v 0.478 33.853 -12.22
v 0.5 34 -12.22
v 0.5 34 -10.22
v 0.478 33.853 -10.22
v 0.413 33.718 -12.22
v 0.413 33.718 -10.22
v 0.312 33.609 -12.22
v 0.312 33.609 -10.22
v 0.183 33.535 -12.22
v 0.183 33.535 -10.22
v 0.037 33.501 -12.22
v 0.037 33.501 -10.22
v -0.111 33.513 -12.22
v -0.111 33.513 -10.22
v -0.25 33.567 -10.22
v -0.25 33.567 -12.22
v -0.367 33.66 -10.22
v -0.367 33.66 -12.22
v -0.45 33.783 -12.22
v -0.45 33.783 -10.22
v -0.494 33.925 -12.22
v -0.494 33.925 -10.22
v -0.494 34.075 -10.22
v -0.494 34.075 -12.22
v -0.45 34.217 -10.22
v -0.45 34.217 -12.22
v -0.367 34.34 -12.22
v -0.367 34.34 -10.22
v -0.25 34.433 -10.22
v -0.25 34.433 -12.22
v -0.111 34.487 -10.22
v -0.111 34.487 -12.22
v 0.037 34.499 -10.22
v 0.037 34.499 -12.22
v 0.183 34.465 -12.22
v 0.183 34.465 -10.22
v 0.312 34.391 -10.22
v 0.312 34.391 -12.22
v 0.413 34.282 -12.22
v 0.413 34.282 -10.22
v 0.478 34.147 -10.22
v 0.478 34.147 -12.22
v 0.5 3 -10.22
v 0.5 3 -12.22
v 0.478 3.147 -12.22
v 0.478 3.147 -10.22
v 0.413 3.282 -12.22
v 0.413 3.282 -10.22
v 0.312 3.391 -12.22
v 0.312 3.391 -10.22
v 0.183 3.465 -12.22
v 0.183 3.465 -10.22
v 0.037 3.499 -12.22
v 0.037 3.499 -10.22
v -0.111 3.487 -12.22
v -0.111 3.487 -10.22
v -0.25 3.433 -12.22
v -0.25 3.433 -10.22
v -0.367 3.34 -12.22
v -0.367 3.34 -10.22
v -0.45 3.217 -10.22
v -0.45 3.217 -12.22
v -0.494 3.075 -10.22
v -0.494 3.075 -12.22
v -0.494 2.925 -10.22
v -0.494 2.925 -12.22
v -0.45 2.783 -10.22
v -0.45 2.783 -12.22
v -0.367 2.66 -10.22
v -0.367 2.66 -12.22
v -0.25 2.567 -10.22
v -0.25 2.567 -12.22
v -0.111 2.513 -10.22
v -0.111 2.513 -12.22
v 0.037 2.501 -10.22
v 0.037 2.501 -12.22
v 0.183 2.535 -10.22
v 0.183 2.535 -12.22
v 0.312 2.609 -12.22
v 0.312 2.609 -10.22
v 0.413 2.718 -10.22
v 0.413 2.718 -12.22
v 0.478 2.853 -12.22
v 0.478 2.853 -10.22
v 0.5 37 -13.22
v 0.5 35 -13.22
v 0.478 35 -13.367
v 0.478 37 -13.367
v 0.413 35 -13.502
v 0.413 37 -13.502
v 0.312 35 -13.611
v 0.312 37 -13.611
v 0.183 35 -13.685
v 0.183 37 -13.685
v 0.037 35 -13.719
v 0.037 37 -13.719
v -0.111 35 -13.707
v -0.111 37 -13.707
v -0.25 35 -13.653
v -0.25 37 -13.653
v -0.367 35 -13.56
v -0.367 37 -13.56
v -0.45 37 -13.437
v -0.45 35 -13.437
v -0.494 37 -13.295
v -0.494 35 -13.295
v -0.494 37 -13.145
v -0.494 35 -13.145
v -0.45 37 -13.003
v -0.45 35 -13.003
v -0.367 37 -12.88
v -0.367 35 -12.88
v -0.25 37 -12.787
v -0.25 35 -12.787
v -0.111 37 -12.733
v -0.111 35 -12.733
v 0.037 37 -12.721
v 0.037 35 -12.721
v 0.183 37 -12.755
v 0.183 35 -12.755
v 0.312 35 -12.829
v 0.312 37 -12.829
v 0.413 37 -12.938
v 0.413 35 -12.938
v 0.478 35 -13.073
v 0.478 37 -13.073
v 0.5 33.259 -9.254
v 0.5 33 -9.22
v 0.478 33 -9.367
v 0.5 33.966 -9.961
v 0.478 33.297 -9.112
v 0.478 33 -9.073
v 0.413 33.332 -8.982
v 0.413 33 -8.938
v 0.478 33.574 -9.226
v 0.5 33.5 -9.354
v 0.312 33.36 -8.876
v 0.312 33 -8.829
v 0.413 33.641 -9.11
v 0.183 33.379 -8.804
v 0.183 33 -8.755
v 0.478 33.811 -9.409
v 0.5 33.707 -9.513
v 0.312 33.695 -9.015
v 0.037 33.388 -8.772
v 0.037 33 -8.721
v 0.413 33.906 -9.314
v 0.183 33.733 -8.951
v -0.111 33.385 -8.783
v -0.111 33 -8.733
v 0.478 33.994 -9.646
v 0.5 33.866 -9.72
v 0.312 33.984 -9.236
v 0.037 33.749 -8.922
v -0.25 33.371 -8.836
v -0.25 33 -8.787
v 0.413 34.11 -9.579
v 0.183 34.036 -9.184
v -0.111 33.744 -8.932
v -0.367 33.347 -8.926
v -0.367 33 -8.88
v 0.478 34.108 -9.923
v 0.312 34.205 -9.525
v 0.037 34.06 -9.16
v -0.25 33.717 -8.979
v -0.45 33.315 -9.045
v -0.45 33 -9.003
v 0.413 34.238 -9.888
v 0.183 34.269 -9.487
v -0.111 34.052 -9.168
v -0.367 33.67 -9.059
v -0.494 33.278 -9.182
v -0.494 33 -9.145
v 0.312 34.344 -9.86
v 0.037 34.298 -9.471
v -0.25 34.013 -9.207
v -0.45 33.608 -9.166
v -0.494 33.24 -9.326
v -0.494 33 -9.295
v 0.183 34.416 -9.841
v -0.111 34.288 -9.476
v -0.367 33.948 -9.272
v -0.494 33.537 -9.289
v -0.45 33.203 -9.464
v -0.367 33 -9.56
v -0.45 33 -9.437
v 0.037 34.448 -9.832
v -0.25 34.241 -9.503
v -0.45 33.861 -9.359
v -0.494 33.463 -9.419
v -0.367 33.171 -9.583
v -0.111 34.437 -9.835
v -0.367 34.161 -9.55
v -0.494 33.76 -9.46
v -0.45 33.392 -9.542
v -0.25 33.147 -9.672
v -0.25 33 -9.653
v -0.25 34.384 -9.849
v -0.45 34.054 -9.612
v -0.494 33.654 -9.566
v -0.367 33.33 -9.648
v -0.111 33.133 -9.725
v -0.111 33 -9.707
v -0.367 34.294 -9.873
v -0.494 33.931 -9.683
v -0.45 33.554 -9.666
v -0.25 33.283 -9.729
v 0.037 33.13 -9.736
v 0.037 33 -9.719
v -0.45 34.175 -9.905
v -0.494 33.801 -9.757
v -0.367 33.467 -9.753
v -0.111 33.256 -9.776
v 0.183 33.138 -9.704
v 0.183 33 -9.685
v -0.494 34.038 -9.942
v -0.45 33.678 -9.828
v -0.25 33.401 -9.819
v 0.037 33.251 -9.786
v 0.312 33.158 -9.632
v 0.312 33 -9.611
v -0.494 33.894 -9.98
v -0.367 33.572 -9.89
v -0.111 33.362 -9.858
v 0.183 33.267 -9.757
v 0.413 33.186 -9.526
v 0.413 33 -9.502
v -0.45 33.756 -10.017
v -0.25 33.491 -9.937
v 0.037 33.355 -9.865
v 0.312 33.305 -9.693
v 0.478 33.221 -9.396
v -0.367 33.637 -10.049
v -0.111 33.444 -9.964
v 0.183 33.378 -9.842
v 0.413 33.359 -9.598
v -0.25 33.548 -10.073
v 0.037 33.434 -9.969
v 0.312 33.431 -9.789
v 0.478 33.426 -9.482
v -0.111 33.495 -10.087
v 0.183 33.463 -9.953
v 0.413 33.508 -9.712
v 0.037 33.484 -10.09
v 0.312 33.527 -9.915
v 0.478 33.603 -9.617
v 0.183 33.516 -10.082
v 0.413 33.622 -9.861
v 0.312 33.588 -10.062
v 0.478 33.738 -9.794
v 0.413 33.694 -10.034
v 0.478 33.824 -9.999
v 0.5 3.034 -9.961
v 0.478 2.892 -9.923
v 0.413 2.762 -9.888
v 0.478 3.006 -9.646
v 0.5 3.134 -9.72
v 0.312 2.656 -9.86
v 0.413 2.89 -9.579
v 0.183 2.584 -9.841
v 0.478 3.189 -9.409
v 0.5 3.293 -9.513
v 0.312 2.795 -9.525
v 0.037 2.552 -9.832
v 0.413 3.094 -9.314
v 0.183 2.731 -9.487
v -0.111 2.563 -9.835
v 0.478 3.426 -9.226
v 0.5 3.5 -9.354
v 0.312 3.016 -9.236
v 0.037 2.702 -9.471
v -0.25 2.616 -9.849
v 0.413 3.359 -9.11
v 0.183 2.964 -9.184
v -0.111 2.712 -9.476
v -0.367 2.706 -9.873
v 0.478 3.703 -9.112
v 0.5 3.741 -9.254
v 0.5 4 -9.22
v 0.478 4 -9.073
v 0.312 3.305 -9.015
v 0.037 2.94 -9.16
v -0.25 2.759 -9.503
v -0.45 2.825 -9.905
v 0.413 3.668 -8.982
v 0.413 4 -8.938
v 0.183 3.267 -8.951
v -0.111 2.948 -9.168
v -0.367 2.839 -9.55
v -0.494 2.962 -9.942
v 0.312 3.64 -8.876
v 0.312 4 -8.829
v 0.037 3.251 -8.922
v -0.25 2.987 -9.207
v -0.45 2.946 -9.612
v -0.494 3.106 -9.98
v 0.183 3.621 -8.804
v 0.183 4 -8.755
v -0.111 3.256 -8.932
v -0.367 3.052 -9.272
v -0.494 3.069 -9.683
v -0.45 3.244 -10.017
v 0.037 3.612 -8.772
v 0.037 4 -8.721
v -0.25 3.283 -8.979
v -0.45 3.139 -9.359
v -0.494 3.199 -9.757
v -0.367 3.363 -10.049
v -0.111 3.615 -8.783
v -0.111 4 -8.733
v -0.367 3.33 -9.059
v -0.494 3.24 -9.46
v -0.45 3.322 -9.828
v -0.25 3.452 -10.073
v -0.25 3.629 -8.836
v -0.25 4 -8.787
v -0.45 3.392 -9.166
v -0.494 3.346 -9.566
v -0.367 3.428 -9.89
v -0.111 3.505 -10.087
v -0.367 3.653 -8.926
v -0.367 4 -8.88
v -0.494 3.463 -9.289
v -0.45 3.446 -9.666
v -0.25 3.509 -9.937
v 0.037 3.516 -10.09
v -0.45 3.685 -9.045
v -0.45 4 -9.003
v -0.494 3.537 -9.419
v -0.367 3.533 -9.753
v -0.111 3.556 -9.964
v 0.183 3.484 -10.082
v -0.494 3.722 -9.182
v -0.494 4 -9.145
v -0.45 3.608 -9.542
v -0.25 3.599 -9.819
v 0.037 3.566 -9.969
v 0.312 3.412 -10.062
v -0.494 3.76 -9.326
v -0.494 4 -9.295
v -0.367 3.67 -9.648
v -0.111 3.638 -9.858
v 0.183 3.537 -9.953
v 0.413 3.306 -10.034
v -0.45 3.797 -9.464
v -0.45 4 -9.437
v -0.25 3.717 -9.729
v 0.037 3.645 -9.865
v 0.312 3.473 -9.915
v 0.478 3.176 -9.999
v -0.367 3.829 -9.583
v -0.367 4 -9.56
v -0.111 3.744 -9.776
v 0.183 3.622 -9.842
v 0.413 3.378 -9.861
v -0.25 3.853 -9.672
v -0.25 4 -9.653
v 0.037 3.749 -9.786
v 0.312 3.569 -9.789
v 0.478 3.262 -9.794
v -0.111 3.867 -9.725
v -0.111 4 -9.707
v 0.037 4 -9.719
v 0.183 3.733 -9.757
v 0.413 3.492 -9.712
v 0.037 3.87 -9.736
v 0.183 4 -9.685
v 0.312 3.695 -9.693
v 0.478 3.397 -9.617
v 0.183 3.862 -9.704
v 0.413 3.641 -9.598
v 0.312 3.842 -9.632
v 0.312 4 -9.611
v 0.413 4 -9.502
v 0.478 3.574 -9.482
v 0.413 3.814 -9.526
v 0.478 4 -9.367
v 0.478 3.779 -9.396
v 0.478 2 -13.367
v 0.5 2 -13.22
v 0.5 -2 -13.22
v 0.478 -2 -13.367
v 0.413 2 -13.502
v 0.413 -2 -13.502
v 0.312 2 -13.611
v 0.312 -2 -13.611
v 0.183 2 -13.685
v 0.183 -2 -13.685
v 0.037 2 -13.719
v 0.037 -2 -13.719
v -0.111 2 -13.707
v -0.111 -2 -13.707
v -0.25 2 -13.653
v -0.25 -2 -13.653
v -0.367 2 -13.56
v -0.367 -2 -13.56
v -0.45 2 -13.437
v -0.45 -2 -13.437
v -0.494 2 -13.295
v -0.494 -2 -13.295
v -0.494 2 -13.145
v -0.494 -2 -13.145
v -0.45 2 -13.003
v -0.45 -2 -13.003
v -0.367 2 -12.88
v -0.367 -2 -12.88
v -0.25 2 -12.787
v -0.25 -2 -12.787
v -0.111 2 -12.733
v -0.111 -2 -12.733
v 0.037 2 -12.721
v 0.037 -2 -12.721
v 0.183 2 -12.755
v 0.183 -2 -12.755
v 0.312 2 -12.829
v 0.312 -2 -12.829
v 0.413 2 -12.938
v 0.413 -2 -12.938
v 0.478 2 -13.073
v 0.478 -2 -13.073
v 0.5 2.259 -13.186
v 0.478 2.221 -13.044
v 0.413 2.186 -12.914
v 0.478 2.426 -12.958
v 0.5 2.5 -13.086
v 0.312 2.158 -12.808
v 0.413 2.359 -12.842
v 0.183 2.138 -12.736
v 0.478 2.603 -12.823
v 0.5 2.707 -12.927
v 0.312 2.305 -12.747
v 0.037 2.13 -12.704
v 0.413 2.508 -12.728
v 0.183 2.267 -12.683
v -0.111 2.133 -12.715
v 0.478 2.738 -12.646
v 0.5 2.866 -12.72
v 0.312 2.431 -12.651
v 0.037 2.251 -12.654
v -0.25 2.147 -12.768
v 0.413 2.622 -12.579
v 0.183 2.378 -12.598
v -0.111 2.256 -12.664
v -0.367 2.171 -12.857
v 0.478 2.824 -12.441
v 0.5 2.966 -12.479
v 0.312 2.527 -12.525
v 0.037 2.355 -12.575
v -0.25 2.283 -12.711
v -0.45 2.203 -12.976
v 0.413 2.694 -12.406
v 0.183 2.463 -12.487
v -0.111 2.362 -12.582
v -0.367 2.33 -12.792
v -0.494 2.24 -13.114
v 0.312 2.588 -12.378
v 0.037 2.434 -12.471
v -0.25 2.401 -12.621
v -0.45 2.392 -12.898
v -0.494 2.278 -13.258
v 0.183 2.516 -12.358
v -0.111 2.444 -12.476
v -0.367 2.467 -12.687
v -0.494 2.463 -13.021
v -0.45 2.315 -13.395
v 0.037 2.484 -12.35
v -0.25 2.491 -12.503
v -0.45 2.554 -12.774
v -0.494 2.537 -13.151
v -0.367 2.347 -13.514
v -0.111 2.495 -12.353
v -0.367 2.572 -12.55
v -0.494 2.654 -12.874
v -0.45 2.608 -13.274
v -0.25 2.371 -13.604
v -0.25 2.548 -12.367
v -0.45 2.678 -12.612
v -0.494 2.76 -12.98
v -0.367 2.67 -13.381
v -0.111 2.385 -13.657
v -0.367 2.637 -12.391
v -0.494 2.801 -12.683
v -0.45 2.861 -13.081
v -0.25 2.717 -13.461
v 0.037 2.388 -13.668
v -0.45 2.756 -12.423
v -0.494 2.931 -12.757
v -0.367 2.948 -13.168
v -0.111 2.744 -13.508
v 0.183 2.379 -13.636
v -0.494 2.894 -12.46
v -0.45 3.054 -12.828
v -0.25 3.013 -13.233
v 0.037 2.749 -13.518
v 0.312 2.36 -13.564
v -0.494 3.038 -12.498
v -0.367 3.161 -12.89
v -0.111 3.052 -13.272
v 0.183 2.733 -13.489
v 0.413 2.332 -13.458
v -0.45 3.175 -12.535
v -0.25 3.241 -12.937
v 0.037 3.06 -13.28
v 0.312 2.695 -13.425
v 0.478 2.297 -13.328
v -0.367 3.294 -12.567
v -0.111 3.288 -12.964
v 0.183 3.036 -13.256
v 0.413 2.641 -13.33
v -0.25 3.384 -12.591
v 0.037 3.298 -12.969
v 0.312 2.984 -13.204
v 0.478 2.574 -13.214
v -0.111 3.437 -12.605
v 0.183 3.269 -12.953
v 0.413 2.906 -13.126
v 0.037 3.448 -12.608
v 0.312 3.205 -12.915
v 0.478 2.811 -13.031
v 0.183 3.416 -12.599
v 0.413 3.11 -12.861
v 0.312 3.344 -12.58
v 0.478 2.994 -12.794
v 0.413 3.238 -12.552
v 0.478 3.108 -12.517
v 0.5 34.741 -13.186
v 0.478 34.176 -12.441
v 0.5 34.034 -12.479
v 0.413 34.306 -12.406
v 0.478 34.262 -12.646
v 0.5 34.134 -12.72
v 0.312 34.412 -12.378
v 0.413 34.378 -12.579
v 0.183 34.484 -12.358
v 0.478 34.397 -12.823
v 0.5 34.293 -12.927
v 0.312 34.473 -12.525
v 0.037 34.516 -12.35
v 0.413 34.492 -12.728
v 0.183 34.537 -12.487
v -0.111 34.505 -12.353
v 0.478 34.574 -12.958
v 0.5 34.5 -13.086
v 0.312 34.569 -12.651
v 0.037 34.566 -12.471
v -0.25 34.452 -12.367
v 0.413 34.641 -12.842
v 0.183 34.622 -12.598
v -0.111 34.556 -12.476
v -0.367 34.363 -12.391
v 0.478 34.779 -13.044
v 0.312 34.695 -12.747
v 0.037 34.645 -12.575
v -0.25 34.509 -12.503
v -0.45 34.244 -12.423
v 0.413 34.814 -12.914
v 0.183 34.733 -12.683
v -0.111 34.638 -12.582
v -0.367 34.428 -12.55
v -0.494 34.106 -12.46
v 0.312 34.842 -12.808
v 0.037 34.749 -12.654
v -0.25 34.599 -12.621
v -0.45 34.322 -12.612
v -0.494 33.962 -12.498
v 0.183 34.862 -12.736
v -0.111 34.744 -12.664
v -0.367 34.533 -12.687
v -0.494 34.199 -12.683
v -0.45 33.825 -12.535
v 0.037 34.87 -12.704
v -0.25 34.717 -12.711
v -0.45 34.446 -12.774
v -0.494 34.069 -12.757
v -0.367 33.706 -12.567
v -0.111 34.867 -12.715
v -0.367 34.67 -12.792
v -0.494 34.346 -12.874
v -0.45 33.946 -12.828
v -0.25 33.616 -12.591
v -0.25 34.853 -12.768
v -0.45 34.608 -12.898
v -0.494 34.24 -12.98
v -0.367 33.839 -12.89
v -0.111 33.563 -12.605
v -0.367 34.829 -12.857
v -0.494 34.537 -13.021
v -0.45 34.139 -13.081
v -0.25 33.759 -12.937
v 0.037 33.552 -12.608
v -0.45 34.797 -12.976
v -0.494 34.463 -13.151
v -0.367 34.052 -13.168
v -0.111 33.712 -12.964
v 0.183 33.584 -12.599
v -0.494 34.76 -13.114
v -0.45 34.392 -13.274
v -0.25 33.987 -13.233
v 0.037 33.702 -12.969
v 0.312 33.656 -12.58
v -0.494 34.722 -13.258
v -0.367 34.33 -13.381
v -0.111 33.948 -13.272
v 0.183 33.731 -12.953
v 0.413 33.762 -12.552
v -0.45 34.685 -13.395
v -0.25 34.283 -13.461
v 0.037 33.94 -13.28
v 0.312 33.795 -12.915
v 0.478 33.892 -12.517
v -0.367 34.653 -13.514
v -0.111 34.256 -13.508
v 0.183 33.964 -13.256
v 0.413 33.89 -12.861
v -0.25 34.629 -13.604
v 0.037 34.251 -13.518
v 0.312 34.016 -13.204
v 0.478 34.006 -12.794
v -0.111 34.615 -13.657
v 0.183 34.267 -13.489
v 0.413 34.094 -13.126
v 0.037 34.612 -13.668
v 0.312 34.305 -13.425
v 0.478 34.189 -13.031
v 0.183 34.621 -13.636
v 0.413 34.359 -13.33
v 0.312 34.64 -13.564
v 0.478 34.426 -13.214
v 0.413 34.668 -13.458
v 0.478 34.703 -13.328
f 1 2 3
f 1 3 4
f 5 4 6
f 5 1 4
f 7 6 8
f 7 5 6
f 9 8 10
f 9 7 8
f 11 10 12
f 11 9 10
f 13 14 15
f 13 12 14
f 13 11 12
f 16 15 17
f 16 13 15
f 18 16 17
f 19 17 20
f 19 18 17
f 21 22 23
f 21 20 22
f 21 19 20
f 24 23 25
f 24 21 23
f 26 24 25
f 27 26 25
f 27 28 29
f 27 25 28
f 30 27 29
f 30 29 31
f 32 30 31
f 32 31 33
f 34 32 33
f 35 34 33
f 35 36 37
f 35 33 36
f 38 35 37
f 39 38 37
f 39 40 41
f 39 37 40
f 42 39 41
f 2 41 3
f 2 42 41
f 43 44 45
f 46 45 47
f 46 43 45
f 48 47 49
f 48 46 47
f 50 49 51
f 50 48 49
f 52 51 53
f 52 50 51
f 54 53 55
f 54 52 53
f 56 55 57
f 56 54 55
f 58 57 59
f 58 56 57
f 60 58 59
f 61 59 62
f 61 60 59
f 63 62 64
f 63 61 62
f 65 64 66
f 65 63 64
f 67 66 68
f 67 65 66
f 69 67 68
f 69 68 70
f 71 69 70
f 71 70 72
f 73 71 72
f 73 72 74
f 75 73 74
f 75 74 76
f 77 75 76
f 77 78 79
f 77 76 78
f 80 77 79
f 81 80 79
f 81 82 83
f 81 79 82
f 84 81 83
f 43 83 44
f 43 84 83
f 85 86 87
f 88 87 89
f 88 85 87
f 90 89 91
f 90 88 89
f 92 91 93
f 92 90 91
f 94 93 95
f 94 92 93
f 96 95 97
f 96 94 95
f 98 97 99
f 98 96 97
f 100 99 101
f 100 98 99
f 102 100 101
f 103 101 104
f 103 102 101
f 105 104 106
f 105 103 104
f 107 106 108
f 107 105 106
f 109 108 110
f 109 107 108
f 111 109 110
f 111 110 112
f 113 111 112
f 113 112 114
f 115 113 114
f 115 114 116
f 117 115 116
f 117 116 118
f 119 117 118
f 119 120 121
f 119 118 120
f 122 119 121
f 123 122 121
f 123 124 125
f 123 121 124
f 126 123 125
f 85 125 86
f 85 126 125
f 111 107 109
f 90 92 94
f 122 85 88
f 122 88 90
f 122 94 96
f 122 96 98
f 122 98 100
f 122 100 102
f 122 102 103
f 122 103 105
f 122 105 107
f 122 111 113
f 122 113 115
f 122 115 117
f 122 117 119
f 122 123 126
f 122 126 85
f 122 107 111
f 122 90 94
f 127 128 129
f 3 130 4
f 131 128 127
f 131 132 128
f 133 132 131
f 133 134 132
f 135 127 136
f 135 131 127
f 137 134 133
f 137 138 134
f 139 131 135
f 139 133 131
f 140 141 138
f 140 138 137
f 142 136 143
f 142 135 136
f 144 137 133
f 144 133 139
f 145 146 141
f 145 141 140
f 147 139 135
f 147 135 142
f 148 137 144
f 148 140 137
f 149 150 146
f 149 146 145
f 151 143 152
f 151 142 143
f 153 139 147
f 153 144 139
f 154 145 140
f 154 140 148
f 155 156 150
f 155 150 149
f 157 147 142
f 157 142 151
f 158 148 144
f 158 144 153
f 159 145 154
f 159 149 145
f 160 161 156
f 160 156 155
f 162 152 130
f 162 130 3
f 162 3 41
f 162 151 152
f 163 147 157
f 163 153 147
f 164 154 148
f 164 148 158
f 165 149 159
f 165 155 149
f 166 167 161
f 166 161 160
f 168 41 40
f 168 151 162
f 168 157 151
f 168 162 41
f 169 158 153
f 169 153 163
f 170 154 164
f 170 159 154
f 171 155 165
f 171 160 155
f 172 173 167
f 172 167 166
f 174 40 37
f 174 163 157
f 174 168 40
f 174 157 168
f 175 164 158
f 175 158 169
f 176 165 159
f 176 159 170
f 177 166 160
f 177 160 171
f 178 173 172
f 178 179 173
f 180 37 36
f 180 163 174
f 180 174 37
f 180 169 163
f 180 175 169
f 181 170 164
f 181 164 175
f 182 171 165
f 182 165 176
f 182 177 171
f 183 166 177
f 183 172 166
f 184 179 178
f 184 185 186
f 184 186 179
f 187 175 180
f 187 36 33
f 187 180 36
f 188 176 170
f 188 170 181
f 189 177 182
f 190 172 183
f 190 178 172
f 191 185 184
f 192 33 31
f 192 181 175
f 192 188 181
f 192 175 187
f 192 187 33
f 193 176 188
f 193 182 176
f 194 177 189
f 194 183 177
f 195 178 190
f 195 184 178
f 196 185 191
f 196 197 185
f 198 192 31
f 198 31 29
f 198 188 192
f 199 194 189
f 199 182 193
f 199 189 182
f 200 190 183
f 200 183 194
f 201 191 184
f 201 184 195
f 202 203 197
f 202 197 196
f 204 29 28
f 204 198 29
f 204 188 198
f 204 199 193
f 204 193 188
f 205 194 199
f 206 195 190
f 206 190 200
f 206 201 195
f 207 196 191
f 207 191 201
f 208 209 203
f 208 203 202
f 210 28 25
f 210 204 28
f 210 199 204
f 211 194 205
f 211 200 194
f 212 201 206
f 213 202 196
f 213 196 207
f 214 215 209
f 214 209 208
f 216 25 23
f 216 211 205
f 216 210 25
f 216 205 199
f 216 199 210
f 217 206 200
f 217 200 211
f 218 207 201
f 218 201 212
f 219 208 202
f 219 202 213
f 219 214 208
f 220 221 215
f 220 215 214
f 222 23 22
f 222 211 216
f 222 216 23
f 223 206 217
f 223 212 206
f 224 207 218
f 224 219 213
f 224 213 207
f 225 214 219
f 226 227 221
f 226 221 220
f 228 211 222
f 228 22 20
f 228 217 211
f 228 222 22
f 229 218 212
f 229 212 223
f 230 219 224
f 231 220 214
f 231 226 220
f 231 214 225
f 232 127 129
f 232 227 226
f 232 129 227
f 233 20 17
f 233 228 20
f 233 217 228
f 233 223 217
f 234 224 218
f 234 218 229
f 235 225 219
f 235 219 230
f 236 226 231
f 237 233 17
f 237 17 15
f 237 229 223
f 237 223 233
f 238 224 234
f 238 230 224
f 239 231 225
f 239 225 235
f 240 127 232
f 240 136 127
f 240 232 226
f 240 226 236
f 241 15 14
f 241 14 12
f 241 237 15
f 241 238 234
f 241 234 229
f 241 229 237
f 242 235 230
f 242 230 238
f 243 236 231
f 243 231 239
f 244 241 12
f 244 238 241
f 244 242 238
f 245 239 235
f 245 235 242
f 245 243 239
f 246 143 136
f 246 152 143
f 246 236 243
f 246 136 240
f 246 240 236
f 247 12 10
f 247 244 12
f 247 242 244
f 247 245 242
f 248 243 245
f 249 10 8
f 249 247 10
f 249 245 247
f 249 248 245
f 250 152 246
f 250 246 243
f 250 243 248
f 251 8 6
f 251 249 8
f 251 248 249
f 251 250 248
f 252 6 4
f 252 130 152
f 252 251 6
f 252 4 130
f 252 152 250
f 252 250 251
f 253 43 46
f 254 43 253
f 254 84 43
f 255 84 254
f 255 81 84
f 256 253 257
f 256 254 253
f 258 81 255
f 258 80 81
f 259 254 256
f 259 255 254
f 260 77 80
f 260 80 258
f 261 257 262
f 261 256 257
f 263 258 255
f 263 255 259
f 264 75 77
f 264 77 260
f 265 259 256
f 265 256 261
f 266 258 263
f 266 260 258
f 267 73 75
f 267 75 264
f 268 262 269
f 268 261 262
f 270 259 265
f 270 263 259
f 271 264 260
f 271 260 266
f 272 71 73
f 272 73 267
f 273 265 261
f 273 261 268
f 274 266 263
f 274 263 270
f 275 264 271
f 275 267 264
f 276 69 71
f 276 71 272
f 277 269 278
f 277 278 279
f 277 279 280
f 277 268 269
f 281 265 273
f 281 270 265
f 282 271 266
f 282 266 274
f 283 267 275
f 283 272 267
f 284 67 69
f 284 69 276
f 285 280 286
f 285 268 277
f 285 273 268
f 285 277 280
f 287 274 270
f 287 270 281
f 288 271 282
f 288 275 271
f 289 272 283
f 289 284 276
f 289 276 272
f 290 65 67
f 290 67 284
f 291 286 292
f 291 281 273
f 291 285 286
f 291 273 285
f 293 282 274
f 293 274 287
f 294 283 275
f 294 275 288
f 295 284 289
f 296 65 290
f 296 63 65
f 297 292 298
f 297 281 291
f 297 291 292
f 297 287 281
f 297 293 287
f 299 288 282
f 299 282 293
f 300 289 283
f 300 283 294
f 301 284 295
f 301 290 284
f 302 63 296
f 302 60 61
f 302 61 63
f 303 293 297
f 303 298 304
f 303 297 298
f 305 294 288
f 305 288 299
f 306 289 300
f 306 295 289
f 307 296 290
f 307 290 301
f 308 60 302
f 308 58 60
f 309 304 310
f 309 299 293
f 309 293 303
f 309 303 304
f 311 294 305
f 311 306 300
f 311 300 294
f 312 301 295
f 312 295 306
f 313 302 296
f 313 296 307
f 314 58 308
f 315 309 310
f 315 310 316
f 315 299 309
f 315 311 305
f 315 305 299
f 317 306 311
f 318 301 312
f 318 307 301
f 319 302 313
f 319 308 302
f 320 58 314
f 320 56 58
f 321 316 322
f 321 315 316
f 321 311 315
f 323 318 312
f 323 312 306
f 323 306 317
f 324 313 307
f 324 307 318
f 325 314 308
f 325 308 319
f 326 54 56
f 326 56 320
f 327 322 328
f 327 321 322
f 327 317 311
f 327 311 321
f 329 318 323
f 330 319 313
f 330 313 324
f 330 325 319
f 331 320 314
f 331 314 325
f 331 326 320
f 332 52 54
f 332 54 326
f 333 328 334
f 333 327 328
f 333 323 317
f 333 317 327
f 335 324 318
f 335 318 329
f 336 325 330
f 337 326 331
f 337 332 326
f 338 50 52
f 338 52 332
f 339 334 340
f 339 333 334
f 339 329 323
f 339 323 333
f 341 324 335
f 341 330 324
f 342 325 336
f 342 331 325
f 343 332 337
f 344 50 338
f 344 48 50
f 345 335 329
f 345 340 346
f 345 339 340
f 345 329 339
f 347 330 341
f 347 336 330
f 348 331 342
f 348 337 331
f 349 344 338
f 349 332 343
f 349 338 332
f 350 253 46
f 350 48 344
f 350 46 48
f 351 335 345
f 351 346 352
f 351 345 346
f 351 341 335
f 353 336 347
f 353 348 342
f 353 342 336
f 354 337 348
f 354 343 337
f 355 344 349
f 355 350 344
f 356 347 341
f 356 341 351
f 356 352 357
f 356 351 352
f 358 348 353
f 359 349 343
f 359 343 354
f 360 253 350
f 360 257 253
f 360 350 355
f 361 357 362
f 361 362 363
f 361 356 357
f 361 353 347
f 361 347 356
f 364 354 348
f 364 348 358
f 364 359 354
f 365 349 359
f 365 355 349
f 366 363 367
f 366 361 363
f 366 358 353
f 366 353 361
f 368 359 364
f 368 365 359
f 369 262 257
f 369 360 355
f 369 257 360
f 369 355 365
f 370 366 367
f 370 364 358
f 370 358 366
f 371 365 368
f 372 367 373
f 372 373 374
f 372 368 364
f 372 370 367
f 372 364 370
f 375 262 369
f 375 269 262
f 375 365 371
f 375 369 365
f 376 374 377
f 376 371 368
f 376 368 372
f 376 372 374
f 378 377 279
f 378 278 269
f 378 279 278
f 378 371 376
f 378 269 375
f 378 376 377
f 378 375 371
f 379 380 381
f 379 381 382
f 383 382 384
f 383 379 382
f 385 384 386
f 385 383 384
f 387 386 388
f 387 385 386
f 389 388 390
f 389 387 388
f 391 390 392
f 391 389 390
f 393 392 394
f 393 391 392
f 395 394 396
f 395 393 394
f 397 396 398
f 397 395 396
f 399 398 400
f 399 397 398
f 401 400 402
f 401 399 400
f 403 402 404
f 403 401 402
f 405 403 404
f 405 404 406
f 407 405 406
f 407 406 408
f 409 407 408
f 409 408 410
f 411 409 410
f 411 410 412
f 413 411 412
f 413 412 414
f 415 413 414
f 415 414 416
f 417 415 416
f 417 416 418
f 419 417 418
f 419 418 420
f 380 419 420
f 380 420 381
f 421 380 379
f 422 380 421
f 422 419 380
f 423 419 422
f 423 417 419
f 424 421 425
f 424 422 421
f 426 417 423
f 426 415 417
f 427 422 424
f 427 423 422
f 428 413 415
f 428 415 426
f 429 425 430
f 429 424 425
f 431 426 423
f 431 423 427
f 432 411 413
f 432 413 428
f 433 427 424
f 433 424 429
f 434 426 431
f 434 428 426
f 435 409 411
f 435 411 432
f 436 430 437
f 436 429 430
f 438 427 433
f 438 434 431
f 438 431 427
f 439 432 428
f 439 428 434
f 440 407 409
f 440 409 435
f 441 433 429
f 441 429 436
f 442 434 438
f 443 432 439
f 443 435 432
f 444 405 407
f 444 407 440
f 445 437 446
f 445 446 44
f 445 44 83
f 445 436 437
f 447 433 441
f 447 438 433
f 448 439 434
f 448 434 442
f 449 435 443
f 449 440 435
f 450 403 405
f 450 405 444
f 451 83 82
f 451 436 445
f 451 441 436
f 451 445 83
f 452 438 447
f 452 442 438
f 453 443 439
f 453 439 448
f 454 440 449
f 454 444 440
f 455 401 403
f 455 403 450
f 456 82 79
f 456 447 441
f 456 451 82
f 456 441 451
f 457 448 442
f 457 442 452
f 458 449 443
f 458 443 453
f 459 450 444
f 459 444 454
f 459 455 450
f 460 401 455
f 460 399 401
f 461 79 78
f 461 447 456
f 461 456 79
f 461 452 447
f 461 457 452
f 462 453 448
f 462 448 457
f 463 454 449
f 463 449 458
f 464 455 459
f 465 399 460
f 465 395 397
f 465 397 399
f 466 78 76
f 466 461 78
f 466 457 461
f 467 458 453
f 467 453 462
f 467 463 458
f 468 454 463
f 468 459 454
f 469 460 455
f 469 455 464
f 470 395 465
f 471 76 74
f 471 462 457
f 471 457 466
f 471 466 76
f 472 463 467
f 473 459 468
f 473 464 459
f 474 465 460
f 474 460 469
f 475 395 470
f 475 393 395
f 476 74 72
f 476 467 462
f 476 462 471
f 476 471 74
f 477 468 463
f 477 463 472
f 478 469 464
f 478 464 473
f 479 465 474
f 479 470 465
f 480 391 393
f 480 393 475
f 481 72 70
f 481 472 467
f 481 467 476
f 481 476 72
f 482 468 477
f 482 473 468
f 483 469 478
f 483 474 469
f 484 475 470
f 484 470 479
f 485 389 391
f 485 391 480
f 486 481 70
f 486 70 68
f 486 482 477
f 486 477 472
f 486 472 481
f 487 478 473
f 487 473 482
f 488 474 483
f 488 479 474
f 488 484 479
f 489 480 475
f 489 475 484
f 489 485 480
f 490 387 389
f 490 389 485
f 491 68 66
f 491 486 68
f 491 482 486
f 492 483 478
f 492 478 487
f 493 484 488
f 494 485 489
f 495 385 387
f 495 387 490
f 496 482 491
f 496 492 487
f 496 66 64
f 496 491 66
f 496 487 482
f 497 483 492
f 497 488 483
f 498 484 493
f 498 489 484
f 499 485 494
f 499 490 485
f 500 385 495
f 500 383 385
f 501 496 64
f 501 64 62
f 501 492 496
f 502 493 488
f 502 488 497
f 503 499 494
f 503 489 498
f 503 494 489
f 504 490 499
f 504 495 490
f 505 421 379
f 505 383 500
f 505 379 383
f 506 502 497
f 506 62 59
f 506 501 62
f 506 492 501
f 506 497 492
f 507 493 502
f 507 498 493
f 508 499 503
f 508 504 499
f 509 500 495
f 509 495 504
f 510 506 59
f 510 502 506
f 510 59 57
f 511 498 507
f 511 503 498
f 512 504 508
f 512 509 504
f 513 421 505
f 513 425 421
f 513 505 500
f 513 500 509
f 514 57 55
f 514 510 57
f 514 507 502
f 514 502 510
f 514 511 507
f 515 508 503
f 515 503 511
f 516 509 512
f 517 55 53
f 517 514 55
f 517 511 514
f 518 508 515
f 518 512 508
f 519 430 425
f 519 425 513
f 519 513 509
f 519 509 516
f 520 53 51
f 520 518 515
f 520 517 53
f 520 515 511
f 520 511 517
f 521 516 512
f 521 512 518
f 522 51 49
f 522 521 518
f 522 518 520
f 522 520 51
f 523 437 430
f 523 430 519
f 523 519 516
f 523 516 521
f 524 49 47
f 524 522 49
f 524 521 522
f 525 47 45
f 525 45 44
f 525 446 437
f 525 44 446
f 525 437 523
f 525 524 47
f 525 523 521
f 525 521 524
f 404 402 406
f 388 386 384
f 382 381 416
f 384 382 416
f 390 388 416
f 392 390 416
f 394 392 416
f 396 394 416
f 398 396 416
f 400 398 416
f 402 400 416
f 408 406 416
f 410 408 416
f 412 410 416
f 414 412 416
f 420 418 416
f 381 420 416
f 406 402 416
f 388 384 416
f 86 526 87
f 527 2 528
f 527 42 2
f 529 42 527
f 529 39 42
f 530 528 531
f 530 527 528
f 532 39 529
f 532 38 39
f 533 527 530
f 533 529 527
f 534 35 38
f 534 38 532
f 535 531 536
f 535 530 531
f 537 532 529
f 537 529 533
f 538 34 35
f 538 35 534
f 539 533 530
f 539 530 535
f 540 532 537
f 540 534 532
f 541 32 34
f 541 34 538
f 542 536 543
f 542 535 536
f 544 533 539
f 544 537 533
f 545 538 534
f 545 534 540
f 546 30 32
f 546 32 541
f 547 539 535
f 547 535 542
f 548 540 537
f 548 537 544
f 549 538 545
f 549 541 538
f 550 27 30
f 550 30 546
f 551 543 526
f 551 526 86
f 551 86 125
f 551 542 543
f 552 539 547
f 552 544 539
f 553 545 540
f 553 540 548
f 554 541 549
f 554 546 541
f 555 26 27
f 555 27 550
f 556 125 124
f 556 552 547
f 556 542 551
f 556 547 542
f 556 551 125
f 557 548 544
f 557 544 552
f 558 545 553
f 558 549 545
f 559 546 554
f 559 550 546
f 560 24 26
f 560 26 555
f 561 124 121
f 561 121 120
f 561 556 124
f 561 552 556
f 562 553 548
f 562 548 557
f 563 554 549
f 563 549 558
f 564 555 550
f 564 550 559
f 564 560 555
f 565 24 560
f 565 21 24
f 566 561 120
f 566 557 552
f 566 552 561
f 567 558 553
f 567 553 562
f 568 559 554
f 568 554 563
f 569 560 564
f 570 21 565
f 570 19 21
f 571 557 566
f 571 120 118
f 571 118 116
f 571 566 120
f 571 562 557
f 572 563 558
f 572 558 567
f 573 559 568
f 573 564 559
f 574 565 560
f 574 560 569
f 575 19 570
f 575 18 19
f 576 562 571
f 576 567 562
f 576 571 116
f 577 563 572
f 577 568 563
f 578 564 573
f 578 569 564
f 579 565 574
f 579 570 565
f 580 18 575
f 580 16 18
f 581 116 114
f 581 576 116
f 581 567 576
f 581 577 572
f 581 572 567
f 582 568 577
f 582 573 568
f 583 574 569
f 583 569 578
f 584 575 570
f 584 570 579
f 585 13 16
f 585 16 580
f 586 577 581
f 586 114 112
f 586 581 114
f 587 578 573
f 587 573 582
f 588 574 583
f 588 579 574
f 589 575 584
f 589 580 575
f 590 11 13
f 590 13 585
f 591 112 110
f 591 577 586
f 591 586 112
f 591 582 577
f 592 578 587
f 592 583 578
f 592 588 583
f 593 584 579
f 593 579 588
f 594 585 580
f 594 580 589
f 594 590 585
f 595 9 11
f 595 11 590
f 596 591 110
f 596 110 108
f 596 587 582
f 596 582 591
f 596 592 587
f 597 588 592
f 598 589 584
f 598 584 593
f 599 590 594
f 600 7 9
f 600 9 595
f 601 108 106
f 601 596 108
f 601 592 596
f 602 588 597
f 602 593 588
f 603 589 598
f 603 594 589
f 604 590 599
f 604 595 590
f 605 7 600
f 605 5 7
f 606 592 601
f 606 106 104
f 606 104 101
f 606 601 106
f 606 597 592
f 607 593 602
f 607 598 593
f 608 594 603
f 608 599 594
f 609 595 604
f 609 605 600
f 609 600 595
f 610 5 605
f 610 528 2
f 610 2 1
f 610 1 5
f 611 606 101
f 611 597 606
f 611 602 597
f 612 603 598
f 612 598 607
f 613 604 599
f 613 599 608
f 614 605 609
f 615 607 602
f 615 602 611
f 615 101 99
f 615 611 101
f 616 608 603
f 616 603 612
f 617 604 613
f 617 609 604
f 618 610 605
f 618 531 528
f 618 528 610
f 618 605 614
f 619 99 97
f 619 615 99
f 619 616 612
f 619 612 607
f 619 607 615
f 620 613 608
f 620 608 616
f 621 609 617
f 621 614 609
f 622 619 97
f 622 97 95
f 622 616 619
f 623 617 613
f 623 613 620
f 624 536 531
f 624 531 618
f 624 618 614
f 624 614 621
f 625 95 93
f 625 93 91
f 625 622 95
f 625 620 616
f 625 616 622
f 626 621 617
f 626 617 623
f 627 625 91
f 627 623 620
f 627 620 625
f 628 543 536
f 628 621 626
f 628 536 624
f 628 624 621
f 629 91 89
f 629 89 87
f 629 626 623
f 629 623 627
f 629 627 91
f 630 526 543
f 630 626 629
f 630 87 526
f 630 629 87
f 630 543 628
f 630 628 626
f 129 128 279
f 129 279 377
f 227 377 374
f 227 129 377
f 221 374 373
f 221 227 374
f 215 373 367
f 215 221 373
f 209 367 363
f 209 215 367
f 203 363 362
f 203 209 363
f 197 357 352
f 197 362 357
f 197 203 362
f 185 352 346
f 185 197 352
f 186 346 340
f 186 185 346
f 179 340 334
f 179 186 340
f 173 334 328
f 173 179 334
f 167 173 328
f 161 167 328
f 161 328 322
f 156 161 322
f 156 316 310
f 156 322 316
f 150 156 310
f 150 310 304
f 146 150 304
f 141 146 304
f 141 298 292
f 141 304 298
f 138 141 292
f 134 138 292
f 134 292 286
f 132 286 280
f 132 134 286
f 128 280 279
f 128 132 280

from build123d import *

# Parameters (mm, degrees)
SKETCH2_R = 0.5


with BuildPart() as part:
    # Sweep1: sweep along a path in Sketch1
    with BuildLine(Plane(origin=(0, 0, 0), x_dir=(0, 0, -1), z_dir=(1, 0, 0))) as sweep1_path:
        Line((13.22, -2), (13.22, 2))
        ThreePointArc((13.22, 2), (12.927106781, 2.707106781), (12.22, 3))
        Line((12.22, 3), (10.22, 3))
        ThreePointArc((10.22, 3), (9.512893219, 3.292893219), (9.22, 4))
        Line((9.22, 4), (9.22, 33))
        ThreePointArc((9.22, 33), (9.512893219, 33.707106781), (10.22, 34))
        Line((10.22, 34), (12.22, 34))
        ThreePointArc((12.22, 34), (12.927106781, 34.292893219), (13.22, 35))
        Line((13.22, 35), (13.22, 37))
    # Sketch2 → Sweep1 (sweep)
    with BuildSketch(Plane(origin=(0, -2, 0), x_dir=(1, 0, 0), z_dir=(0, 1, 0))):
        with Locations((0, 13.22)):
            Circle(SKETCH2_R)
    sweep(path=sweep1_path.line)


solid = part.part
